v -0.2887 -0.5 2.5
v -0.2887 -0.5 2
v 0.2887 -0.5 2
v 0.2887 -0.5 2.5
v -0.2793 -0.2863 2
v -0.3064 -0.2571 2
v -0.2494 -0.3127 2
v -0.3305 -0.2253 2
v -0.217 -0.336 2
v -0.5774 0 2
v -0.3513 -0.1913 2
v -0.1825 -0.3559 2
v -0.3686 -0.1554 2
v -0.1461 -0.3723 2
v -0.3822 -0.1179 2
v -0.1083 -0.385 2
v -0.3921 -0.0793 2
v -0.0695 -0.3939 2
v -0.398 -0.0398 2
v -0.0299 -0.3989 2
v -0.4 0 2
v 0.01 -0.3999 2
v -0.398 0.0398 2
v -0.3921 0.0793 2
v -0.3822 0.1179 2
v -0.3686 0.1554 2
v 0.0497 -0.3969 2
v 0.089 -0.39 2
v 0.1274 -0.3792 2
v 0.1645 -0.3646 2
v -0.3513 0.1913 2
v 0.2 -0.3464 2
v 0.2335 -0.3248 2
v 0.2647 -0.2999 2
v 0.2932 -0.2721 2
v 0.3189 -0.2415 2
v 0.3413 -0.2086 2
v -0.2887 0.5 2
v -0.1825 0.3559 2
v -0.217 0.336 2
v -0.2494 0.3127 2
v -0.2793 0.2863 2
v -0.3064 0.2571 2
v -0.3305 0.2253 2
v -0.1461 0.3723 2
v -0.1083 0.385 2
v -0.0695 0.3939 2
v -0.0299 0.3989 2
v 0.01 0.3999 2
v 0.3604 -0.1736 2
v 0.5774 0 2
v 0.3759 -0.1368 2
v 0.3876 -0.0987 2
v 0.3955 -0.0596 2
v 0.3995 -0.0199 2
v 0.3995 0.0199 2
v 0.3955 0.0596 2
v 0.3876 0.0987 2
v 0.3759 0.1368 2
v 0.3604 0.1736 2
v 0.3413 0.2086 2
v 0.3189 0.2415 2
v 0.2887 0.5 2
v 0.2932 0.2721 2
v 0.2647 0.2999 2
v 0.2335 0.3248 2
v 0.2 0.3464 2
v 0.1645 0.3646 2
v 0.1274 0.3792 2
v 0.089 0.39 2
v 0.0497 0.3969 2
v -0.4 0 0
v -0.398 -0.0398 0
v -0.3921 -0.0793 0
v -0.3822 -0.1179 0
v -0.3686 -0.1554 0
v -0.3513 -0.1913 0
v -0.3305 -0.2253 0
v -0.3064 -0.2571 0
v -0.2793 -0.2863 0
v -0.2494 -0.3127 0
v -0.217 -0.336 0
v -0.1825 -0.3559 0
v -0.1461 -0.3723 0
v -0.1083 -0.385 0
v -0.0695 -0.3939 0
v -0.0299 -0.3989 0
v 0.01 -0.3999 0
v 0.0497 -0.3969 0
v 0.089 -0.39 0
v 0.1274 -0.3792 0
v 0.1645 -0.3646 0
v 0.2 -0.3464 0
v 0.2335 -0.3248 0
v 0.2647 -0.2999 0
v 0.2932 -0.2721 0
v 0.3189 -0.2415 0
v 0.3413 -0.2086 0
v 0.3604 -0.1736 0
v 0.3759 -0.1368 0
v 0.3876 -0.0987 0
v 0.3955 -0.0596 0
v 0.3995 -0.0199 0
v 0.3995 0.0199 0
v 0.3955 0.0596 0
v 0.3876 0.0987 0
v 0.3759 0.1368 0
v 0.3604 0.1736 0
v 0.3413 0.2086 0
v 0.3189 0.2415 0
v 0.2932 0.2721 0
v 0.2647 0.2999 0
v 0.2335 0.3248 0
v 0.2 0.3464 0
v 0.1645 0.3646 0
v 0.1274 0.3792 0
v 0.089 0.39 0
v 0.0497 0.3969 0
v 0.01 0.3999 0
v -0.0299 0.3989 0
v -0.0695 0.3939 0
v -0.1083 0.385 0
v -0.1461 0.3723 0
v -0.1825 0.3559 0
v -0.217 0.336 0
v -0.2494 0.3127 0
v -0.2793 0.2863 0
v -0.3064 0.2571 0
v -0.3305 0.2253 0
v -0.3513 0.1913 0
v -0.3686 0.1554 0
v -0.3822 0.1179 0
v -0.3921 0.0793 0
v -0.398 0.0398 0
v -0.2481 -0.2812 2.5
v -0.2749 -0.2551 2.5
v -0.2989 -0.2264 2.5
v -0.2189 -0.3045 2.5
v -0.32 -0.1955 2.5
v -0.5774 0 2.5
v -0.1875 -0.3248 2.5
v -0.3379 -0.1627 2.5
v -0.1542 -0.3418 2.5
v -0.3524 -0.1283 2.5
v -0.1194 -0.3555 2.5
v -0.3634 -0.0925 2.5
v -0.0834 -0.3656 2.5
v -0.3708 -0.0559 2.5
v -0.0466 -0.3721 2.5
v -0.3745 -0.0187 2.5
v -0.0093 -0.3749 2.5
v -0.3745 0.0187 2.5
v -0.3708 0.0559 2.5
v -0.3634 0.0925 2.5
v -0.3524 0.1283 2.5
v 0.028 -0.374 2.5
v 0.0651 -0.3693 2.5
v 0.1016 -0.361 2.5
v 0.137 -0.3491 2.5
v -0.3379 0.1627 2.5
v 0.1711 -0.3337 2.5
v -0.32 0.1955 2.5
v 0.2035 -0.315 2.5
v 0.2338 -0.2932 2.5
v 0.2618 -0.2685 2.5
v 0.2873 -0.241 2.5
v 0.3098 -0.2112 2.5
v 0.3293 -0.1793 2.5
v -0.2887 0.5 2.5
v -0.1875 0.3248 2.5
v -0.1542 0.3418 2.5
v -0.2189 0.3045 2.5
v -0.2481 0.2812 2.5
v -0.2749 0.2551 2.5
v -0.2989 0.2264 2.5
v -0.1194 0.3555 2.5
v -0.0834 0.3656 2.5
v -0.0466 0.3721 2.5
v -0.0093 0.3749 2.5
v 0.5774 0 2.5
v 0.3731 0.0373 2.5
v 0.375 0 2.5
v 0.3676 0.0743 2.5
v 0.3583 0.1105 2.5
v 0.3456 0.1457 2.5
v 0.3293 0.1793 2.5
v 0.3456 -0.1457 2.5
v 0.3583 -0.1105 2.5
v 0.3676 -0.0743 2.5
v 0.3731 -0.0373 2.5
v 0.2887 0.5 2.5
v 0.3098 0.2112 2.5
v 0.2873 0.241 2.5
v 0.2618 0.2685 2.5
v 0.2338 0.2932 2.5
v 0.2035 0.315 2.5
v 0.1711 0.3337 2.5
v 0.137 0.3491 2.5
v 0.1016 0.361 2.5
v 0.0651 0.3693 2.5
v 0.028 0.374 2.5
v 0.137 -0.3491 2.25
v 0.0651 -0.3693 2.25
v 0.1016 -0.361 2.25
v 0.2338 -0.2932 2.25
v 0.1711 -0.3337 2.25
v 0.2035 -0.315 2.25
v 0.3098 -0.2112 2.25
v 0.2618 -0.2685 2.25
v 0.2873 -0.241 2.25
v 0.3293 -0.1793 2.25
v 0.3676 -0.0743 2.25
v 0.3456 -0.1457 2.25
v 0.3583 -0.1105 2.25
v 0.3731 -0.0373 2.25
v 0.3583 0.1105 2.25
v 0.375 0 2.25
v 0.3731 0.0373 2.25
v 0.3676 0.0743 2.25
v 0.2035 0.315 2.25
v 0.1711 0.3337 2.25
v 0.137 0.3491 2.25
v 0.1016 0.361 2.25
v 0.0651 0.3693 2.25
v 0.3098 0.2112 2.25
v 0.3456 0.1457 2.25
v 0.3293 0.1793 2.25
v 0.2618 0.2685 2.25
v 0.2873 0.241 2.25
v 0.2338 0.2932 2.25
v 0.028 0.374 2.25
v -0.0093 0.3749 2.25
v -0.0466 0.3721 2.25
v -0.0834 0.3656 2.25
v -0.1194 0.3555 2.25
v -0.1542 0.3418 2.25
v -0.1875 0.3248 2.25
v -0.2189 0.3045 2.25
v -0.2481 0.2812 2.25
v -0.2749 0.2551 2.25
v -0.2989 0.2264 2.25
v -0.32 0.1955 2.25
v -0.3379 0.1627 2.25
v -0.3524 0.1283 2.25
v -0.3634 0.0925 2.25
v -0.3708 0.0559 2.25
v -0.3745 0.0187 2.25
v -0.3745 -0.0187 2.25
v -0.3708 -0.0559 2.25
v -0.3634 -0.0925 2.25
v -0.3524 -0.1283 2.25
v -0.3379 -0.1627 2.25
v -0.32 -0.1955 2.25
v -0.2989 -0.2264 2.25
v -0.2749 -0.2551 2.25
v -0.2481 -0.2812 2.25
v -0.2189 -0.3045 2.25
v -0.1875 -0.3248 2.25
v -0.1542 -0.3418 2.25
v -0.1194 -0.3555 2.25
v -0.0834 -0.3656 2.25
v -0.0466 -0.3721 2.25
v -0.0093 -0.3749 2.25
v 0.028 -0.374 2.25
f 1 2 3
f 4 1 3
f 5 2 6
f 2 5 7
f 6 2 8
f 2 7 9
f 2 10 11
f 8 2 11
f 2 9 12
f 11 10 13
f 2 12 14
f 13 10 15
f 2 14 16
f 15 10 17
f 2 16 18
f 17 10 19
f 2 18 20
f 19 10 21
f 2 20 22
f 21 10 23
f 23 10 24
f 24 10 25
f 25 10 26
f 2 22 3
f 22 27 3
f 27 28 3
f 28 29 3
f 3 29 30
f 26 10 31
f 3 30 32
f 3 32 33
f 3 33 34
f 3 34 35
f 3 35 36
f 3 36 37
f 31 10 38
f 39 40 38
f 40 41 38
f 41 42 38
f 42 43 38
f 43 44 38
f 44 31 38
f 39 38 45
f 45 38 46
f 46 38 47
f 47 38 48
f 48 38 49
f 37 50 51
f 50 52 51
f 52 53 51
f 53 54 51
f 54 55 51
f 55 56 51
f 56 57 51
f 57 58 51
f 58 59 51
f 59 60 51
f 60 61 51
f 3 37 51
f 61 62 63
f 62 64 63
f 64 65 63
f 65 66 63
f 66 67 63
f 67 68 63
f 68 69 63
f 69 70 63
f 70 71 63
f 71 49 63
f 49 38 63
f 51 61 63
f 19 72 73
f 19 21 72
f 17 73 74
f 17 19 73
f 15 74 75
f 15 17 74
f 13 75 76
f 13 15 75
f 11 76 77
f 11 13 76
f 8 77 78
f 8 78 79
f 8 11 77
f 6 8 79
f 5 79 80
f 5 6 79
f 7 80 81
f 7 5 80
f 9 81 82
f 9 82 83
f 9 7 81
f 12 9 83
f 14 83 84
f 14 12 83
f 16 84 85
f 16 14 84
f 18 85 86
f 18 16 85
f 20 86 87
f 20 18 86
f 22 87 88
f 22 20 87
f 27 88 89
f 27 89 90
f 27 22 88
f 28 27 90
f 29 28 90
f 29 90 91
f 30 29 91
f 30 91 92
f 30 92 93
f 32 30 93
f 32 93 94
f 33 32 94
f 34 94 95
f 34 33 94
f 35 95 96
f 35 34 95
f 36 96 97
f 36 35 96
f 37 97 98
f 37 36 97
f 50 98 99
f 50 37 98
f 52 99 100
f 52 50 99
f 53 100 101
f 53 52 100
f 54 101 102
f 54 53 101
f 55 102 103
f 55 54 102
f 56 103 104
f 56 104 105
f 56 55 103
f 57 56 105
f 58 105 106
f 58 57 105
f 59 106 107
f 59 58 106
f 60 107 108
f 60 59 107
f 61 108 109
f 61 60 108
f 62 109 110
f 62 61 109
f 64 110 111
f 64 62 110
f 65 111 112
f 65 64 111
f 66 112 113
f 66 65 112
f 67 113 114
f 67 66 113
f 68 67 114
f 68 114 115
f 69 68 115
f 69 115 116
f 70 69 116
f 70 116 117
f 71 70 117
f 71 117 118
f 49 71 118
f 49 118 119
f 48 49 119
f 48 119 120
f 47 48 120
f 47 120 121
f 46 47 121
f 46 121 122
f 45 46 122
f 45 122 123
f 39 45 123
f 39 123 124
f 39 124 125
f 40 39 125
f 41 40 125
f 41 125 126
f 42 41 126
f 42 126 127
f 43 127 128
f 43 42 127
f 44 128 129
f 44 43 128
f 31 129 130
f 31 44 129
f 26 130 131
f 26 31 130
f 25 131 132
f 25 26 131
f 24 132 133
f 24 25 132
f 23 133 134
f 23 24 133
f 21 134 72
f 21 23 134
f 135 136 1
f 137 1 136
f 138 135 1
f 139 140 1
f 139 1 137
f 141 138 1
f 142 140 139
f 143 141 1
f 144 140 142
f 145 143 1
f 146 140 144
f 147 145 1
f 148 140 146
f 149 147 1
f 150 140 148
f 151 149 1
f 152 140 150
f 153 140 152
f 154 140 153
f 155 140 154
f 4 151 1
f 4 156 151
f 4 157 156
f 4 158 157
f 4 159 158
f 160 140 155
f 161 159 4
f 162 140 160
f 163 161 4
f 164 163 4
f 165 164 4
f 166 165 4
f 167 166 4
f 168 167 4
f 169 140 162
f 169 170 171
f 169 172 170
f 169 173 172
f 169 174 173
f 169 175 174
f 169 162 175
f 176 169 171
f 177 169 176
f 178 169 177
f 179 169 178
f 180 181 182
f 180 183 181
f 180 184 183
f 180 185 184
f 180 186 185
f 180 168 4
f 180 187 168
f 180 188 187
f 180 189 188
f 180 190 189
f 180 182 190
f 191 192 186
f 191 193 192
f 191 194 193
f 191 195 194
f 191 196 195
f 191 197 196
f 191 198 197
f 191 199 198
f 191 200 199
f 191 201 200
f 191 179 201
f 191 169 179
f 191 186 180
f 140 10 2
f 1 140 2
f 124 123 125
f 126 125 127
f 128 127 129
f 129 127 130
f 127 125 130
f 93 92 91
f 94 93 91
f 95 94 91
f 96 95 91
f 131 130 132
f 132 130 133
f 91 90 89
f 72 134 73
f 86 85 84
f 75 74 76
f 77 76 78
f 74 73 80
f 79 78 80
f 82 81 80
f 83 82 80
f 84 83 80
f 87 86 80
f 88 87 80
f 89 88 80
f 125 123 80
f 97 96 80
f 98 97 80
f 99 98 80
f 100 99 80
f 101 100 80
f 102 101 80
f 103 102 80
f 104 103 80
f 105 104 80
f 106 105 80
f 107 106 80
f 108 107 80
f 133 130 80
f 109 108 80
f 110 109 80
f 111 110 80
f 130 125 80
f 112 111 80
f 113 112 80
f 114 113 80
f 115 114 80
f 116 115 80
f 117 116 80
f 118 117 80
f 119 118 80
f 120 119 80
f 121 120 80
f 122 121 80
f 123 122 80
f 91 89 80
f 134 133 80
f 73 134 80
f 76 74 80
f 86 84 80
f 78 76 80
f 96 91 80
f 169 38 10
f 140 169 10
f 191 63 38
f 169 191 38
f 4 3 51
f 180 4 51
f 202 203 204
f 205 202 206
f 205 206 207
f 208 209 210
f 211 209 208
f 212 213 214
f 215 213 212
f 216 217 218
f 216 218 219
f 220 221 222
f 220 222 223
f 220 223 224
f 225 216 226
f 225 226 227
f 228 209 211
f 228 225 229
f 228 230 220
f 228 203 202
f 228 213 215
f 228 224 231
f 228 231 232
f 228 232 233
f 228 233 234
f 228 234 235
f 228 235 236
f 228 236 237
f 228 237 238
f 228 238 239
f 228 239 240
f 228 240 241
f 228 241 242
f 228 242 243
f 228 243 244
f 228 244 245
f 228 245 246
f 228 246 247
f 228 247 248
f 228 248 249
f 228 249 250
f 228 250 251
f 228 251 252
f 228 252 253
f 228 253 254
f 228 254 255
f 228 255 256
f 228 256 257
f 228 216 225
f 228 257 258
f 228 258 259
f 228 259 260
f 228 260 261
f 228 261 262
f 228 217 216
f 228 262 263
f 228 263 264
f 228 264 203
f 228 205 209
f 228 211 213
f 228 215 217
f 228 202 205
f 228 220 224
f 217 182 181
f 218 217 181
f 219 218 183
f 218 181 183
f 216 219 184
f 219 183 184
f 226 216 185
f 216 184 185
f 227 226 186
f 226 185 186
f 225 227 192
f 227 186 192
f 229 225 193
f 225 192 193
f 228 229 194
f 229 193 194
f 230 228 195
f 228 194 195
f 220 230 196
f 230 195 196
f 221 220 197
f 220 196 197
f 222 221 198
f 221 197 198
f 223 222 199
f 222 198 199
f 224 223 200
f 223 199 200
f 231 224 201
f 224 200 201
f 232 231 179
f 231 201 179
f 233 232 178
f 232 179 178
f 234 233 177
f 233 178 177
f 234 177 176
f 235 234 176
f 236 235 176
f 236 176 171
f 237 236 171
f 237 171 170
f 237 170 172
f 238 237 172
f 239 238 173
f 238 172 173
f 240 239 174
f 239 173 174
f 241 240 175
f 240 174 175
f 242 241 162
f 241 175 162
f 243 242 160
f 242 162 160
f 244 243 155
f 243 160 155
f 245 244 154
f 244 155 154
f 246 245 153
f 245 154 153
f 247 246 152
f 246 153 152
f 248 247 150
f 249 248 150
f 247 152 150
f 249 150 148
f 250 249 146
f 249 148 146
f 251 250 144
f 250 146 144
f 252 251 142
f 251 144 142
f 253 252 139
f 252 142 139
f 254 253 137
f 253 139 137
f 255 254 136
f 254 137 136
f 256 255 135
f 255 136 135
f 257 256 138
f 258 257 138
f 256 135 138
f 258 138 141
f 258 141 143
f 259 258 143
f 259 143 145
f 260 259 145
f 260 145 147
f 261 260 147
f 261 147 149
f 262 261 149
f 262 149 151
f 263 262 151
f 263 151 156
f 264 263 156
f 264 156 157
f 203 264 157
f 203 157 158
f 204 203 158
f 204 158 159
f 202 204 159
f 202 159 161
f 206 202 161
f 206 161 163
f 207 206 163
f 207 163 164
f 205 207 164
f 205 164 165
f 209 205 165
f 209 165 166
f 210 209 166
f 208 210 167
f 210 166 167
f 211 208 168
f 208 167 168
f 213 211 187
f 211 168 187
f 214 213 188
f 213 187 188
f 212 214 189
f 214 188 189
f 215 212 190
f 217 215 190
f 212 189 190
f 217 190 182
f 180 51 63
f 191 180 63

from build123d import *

# Parameters (mm, degrees)
F0_W     = 0.4
F0_H     = 2
F2_R     = 0.4
F3_DEPTH = 0.5
F4_R     = 0.375
F5_DEPTH = 0.25


with BuildPart() as f1:
    # F0 (on Front) → F1 (revolve)
    with BuildSketch(Plane.XZ):
        with Locations((-0.2, 1)):
            Rectangle(F0_W, F0_H)
    revolve(axis=Axis((0, 0, 1), (0, 0, 1)))

    # F2 (on face) → F3 (join)
    with BuildSketch(Plane.XY.offset(2)):
        Polygon((0.2886751346, 0.5), (-0.2886751346, 0.5), (-0.5773502692, 0), (-0.2886751346, -0.5), (0.2886751346, -0.5), (0.5773502692, 0), align=None)
        Circle(F2_R, mode=Mode.SUBTRACT)
        Circle(F2_R)
    extrude(amount=F3_DEPTH)

    # F4 (on face) → F5 (cut)
    with BuildSketch(Plane.XY.offset(2.5)):
        Circle(F4_R)
    extrude(amount=-F5_DEPTH, mode=Mode.SUBTRACT)


solid = f1.part
